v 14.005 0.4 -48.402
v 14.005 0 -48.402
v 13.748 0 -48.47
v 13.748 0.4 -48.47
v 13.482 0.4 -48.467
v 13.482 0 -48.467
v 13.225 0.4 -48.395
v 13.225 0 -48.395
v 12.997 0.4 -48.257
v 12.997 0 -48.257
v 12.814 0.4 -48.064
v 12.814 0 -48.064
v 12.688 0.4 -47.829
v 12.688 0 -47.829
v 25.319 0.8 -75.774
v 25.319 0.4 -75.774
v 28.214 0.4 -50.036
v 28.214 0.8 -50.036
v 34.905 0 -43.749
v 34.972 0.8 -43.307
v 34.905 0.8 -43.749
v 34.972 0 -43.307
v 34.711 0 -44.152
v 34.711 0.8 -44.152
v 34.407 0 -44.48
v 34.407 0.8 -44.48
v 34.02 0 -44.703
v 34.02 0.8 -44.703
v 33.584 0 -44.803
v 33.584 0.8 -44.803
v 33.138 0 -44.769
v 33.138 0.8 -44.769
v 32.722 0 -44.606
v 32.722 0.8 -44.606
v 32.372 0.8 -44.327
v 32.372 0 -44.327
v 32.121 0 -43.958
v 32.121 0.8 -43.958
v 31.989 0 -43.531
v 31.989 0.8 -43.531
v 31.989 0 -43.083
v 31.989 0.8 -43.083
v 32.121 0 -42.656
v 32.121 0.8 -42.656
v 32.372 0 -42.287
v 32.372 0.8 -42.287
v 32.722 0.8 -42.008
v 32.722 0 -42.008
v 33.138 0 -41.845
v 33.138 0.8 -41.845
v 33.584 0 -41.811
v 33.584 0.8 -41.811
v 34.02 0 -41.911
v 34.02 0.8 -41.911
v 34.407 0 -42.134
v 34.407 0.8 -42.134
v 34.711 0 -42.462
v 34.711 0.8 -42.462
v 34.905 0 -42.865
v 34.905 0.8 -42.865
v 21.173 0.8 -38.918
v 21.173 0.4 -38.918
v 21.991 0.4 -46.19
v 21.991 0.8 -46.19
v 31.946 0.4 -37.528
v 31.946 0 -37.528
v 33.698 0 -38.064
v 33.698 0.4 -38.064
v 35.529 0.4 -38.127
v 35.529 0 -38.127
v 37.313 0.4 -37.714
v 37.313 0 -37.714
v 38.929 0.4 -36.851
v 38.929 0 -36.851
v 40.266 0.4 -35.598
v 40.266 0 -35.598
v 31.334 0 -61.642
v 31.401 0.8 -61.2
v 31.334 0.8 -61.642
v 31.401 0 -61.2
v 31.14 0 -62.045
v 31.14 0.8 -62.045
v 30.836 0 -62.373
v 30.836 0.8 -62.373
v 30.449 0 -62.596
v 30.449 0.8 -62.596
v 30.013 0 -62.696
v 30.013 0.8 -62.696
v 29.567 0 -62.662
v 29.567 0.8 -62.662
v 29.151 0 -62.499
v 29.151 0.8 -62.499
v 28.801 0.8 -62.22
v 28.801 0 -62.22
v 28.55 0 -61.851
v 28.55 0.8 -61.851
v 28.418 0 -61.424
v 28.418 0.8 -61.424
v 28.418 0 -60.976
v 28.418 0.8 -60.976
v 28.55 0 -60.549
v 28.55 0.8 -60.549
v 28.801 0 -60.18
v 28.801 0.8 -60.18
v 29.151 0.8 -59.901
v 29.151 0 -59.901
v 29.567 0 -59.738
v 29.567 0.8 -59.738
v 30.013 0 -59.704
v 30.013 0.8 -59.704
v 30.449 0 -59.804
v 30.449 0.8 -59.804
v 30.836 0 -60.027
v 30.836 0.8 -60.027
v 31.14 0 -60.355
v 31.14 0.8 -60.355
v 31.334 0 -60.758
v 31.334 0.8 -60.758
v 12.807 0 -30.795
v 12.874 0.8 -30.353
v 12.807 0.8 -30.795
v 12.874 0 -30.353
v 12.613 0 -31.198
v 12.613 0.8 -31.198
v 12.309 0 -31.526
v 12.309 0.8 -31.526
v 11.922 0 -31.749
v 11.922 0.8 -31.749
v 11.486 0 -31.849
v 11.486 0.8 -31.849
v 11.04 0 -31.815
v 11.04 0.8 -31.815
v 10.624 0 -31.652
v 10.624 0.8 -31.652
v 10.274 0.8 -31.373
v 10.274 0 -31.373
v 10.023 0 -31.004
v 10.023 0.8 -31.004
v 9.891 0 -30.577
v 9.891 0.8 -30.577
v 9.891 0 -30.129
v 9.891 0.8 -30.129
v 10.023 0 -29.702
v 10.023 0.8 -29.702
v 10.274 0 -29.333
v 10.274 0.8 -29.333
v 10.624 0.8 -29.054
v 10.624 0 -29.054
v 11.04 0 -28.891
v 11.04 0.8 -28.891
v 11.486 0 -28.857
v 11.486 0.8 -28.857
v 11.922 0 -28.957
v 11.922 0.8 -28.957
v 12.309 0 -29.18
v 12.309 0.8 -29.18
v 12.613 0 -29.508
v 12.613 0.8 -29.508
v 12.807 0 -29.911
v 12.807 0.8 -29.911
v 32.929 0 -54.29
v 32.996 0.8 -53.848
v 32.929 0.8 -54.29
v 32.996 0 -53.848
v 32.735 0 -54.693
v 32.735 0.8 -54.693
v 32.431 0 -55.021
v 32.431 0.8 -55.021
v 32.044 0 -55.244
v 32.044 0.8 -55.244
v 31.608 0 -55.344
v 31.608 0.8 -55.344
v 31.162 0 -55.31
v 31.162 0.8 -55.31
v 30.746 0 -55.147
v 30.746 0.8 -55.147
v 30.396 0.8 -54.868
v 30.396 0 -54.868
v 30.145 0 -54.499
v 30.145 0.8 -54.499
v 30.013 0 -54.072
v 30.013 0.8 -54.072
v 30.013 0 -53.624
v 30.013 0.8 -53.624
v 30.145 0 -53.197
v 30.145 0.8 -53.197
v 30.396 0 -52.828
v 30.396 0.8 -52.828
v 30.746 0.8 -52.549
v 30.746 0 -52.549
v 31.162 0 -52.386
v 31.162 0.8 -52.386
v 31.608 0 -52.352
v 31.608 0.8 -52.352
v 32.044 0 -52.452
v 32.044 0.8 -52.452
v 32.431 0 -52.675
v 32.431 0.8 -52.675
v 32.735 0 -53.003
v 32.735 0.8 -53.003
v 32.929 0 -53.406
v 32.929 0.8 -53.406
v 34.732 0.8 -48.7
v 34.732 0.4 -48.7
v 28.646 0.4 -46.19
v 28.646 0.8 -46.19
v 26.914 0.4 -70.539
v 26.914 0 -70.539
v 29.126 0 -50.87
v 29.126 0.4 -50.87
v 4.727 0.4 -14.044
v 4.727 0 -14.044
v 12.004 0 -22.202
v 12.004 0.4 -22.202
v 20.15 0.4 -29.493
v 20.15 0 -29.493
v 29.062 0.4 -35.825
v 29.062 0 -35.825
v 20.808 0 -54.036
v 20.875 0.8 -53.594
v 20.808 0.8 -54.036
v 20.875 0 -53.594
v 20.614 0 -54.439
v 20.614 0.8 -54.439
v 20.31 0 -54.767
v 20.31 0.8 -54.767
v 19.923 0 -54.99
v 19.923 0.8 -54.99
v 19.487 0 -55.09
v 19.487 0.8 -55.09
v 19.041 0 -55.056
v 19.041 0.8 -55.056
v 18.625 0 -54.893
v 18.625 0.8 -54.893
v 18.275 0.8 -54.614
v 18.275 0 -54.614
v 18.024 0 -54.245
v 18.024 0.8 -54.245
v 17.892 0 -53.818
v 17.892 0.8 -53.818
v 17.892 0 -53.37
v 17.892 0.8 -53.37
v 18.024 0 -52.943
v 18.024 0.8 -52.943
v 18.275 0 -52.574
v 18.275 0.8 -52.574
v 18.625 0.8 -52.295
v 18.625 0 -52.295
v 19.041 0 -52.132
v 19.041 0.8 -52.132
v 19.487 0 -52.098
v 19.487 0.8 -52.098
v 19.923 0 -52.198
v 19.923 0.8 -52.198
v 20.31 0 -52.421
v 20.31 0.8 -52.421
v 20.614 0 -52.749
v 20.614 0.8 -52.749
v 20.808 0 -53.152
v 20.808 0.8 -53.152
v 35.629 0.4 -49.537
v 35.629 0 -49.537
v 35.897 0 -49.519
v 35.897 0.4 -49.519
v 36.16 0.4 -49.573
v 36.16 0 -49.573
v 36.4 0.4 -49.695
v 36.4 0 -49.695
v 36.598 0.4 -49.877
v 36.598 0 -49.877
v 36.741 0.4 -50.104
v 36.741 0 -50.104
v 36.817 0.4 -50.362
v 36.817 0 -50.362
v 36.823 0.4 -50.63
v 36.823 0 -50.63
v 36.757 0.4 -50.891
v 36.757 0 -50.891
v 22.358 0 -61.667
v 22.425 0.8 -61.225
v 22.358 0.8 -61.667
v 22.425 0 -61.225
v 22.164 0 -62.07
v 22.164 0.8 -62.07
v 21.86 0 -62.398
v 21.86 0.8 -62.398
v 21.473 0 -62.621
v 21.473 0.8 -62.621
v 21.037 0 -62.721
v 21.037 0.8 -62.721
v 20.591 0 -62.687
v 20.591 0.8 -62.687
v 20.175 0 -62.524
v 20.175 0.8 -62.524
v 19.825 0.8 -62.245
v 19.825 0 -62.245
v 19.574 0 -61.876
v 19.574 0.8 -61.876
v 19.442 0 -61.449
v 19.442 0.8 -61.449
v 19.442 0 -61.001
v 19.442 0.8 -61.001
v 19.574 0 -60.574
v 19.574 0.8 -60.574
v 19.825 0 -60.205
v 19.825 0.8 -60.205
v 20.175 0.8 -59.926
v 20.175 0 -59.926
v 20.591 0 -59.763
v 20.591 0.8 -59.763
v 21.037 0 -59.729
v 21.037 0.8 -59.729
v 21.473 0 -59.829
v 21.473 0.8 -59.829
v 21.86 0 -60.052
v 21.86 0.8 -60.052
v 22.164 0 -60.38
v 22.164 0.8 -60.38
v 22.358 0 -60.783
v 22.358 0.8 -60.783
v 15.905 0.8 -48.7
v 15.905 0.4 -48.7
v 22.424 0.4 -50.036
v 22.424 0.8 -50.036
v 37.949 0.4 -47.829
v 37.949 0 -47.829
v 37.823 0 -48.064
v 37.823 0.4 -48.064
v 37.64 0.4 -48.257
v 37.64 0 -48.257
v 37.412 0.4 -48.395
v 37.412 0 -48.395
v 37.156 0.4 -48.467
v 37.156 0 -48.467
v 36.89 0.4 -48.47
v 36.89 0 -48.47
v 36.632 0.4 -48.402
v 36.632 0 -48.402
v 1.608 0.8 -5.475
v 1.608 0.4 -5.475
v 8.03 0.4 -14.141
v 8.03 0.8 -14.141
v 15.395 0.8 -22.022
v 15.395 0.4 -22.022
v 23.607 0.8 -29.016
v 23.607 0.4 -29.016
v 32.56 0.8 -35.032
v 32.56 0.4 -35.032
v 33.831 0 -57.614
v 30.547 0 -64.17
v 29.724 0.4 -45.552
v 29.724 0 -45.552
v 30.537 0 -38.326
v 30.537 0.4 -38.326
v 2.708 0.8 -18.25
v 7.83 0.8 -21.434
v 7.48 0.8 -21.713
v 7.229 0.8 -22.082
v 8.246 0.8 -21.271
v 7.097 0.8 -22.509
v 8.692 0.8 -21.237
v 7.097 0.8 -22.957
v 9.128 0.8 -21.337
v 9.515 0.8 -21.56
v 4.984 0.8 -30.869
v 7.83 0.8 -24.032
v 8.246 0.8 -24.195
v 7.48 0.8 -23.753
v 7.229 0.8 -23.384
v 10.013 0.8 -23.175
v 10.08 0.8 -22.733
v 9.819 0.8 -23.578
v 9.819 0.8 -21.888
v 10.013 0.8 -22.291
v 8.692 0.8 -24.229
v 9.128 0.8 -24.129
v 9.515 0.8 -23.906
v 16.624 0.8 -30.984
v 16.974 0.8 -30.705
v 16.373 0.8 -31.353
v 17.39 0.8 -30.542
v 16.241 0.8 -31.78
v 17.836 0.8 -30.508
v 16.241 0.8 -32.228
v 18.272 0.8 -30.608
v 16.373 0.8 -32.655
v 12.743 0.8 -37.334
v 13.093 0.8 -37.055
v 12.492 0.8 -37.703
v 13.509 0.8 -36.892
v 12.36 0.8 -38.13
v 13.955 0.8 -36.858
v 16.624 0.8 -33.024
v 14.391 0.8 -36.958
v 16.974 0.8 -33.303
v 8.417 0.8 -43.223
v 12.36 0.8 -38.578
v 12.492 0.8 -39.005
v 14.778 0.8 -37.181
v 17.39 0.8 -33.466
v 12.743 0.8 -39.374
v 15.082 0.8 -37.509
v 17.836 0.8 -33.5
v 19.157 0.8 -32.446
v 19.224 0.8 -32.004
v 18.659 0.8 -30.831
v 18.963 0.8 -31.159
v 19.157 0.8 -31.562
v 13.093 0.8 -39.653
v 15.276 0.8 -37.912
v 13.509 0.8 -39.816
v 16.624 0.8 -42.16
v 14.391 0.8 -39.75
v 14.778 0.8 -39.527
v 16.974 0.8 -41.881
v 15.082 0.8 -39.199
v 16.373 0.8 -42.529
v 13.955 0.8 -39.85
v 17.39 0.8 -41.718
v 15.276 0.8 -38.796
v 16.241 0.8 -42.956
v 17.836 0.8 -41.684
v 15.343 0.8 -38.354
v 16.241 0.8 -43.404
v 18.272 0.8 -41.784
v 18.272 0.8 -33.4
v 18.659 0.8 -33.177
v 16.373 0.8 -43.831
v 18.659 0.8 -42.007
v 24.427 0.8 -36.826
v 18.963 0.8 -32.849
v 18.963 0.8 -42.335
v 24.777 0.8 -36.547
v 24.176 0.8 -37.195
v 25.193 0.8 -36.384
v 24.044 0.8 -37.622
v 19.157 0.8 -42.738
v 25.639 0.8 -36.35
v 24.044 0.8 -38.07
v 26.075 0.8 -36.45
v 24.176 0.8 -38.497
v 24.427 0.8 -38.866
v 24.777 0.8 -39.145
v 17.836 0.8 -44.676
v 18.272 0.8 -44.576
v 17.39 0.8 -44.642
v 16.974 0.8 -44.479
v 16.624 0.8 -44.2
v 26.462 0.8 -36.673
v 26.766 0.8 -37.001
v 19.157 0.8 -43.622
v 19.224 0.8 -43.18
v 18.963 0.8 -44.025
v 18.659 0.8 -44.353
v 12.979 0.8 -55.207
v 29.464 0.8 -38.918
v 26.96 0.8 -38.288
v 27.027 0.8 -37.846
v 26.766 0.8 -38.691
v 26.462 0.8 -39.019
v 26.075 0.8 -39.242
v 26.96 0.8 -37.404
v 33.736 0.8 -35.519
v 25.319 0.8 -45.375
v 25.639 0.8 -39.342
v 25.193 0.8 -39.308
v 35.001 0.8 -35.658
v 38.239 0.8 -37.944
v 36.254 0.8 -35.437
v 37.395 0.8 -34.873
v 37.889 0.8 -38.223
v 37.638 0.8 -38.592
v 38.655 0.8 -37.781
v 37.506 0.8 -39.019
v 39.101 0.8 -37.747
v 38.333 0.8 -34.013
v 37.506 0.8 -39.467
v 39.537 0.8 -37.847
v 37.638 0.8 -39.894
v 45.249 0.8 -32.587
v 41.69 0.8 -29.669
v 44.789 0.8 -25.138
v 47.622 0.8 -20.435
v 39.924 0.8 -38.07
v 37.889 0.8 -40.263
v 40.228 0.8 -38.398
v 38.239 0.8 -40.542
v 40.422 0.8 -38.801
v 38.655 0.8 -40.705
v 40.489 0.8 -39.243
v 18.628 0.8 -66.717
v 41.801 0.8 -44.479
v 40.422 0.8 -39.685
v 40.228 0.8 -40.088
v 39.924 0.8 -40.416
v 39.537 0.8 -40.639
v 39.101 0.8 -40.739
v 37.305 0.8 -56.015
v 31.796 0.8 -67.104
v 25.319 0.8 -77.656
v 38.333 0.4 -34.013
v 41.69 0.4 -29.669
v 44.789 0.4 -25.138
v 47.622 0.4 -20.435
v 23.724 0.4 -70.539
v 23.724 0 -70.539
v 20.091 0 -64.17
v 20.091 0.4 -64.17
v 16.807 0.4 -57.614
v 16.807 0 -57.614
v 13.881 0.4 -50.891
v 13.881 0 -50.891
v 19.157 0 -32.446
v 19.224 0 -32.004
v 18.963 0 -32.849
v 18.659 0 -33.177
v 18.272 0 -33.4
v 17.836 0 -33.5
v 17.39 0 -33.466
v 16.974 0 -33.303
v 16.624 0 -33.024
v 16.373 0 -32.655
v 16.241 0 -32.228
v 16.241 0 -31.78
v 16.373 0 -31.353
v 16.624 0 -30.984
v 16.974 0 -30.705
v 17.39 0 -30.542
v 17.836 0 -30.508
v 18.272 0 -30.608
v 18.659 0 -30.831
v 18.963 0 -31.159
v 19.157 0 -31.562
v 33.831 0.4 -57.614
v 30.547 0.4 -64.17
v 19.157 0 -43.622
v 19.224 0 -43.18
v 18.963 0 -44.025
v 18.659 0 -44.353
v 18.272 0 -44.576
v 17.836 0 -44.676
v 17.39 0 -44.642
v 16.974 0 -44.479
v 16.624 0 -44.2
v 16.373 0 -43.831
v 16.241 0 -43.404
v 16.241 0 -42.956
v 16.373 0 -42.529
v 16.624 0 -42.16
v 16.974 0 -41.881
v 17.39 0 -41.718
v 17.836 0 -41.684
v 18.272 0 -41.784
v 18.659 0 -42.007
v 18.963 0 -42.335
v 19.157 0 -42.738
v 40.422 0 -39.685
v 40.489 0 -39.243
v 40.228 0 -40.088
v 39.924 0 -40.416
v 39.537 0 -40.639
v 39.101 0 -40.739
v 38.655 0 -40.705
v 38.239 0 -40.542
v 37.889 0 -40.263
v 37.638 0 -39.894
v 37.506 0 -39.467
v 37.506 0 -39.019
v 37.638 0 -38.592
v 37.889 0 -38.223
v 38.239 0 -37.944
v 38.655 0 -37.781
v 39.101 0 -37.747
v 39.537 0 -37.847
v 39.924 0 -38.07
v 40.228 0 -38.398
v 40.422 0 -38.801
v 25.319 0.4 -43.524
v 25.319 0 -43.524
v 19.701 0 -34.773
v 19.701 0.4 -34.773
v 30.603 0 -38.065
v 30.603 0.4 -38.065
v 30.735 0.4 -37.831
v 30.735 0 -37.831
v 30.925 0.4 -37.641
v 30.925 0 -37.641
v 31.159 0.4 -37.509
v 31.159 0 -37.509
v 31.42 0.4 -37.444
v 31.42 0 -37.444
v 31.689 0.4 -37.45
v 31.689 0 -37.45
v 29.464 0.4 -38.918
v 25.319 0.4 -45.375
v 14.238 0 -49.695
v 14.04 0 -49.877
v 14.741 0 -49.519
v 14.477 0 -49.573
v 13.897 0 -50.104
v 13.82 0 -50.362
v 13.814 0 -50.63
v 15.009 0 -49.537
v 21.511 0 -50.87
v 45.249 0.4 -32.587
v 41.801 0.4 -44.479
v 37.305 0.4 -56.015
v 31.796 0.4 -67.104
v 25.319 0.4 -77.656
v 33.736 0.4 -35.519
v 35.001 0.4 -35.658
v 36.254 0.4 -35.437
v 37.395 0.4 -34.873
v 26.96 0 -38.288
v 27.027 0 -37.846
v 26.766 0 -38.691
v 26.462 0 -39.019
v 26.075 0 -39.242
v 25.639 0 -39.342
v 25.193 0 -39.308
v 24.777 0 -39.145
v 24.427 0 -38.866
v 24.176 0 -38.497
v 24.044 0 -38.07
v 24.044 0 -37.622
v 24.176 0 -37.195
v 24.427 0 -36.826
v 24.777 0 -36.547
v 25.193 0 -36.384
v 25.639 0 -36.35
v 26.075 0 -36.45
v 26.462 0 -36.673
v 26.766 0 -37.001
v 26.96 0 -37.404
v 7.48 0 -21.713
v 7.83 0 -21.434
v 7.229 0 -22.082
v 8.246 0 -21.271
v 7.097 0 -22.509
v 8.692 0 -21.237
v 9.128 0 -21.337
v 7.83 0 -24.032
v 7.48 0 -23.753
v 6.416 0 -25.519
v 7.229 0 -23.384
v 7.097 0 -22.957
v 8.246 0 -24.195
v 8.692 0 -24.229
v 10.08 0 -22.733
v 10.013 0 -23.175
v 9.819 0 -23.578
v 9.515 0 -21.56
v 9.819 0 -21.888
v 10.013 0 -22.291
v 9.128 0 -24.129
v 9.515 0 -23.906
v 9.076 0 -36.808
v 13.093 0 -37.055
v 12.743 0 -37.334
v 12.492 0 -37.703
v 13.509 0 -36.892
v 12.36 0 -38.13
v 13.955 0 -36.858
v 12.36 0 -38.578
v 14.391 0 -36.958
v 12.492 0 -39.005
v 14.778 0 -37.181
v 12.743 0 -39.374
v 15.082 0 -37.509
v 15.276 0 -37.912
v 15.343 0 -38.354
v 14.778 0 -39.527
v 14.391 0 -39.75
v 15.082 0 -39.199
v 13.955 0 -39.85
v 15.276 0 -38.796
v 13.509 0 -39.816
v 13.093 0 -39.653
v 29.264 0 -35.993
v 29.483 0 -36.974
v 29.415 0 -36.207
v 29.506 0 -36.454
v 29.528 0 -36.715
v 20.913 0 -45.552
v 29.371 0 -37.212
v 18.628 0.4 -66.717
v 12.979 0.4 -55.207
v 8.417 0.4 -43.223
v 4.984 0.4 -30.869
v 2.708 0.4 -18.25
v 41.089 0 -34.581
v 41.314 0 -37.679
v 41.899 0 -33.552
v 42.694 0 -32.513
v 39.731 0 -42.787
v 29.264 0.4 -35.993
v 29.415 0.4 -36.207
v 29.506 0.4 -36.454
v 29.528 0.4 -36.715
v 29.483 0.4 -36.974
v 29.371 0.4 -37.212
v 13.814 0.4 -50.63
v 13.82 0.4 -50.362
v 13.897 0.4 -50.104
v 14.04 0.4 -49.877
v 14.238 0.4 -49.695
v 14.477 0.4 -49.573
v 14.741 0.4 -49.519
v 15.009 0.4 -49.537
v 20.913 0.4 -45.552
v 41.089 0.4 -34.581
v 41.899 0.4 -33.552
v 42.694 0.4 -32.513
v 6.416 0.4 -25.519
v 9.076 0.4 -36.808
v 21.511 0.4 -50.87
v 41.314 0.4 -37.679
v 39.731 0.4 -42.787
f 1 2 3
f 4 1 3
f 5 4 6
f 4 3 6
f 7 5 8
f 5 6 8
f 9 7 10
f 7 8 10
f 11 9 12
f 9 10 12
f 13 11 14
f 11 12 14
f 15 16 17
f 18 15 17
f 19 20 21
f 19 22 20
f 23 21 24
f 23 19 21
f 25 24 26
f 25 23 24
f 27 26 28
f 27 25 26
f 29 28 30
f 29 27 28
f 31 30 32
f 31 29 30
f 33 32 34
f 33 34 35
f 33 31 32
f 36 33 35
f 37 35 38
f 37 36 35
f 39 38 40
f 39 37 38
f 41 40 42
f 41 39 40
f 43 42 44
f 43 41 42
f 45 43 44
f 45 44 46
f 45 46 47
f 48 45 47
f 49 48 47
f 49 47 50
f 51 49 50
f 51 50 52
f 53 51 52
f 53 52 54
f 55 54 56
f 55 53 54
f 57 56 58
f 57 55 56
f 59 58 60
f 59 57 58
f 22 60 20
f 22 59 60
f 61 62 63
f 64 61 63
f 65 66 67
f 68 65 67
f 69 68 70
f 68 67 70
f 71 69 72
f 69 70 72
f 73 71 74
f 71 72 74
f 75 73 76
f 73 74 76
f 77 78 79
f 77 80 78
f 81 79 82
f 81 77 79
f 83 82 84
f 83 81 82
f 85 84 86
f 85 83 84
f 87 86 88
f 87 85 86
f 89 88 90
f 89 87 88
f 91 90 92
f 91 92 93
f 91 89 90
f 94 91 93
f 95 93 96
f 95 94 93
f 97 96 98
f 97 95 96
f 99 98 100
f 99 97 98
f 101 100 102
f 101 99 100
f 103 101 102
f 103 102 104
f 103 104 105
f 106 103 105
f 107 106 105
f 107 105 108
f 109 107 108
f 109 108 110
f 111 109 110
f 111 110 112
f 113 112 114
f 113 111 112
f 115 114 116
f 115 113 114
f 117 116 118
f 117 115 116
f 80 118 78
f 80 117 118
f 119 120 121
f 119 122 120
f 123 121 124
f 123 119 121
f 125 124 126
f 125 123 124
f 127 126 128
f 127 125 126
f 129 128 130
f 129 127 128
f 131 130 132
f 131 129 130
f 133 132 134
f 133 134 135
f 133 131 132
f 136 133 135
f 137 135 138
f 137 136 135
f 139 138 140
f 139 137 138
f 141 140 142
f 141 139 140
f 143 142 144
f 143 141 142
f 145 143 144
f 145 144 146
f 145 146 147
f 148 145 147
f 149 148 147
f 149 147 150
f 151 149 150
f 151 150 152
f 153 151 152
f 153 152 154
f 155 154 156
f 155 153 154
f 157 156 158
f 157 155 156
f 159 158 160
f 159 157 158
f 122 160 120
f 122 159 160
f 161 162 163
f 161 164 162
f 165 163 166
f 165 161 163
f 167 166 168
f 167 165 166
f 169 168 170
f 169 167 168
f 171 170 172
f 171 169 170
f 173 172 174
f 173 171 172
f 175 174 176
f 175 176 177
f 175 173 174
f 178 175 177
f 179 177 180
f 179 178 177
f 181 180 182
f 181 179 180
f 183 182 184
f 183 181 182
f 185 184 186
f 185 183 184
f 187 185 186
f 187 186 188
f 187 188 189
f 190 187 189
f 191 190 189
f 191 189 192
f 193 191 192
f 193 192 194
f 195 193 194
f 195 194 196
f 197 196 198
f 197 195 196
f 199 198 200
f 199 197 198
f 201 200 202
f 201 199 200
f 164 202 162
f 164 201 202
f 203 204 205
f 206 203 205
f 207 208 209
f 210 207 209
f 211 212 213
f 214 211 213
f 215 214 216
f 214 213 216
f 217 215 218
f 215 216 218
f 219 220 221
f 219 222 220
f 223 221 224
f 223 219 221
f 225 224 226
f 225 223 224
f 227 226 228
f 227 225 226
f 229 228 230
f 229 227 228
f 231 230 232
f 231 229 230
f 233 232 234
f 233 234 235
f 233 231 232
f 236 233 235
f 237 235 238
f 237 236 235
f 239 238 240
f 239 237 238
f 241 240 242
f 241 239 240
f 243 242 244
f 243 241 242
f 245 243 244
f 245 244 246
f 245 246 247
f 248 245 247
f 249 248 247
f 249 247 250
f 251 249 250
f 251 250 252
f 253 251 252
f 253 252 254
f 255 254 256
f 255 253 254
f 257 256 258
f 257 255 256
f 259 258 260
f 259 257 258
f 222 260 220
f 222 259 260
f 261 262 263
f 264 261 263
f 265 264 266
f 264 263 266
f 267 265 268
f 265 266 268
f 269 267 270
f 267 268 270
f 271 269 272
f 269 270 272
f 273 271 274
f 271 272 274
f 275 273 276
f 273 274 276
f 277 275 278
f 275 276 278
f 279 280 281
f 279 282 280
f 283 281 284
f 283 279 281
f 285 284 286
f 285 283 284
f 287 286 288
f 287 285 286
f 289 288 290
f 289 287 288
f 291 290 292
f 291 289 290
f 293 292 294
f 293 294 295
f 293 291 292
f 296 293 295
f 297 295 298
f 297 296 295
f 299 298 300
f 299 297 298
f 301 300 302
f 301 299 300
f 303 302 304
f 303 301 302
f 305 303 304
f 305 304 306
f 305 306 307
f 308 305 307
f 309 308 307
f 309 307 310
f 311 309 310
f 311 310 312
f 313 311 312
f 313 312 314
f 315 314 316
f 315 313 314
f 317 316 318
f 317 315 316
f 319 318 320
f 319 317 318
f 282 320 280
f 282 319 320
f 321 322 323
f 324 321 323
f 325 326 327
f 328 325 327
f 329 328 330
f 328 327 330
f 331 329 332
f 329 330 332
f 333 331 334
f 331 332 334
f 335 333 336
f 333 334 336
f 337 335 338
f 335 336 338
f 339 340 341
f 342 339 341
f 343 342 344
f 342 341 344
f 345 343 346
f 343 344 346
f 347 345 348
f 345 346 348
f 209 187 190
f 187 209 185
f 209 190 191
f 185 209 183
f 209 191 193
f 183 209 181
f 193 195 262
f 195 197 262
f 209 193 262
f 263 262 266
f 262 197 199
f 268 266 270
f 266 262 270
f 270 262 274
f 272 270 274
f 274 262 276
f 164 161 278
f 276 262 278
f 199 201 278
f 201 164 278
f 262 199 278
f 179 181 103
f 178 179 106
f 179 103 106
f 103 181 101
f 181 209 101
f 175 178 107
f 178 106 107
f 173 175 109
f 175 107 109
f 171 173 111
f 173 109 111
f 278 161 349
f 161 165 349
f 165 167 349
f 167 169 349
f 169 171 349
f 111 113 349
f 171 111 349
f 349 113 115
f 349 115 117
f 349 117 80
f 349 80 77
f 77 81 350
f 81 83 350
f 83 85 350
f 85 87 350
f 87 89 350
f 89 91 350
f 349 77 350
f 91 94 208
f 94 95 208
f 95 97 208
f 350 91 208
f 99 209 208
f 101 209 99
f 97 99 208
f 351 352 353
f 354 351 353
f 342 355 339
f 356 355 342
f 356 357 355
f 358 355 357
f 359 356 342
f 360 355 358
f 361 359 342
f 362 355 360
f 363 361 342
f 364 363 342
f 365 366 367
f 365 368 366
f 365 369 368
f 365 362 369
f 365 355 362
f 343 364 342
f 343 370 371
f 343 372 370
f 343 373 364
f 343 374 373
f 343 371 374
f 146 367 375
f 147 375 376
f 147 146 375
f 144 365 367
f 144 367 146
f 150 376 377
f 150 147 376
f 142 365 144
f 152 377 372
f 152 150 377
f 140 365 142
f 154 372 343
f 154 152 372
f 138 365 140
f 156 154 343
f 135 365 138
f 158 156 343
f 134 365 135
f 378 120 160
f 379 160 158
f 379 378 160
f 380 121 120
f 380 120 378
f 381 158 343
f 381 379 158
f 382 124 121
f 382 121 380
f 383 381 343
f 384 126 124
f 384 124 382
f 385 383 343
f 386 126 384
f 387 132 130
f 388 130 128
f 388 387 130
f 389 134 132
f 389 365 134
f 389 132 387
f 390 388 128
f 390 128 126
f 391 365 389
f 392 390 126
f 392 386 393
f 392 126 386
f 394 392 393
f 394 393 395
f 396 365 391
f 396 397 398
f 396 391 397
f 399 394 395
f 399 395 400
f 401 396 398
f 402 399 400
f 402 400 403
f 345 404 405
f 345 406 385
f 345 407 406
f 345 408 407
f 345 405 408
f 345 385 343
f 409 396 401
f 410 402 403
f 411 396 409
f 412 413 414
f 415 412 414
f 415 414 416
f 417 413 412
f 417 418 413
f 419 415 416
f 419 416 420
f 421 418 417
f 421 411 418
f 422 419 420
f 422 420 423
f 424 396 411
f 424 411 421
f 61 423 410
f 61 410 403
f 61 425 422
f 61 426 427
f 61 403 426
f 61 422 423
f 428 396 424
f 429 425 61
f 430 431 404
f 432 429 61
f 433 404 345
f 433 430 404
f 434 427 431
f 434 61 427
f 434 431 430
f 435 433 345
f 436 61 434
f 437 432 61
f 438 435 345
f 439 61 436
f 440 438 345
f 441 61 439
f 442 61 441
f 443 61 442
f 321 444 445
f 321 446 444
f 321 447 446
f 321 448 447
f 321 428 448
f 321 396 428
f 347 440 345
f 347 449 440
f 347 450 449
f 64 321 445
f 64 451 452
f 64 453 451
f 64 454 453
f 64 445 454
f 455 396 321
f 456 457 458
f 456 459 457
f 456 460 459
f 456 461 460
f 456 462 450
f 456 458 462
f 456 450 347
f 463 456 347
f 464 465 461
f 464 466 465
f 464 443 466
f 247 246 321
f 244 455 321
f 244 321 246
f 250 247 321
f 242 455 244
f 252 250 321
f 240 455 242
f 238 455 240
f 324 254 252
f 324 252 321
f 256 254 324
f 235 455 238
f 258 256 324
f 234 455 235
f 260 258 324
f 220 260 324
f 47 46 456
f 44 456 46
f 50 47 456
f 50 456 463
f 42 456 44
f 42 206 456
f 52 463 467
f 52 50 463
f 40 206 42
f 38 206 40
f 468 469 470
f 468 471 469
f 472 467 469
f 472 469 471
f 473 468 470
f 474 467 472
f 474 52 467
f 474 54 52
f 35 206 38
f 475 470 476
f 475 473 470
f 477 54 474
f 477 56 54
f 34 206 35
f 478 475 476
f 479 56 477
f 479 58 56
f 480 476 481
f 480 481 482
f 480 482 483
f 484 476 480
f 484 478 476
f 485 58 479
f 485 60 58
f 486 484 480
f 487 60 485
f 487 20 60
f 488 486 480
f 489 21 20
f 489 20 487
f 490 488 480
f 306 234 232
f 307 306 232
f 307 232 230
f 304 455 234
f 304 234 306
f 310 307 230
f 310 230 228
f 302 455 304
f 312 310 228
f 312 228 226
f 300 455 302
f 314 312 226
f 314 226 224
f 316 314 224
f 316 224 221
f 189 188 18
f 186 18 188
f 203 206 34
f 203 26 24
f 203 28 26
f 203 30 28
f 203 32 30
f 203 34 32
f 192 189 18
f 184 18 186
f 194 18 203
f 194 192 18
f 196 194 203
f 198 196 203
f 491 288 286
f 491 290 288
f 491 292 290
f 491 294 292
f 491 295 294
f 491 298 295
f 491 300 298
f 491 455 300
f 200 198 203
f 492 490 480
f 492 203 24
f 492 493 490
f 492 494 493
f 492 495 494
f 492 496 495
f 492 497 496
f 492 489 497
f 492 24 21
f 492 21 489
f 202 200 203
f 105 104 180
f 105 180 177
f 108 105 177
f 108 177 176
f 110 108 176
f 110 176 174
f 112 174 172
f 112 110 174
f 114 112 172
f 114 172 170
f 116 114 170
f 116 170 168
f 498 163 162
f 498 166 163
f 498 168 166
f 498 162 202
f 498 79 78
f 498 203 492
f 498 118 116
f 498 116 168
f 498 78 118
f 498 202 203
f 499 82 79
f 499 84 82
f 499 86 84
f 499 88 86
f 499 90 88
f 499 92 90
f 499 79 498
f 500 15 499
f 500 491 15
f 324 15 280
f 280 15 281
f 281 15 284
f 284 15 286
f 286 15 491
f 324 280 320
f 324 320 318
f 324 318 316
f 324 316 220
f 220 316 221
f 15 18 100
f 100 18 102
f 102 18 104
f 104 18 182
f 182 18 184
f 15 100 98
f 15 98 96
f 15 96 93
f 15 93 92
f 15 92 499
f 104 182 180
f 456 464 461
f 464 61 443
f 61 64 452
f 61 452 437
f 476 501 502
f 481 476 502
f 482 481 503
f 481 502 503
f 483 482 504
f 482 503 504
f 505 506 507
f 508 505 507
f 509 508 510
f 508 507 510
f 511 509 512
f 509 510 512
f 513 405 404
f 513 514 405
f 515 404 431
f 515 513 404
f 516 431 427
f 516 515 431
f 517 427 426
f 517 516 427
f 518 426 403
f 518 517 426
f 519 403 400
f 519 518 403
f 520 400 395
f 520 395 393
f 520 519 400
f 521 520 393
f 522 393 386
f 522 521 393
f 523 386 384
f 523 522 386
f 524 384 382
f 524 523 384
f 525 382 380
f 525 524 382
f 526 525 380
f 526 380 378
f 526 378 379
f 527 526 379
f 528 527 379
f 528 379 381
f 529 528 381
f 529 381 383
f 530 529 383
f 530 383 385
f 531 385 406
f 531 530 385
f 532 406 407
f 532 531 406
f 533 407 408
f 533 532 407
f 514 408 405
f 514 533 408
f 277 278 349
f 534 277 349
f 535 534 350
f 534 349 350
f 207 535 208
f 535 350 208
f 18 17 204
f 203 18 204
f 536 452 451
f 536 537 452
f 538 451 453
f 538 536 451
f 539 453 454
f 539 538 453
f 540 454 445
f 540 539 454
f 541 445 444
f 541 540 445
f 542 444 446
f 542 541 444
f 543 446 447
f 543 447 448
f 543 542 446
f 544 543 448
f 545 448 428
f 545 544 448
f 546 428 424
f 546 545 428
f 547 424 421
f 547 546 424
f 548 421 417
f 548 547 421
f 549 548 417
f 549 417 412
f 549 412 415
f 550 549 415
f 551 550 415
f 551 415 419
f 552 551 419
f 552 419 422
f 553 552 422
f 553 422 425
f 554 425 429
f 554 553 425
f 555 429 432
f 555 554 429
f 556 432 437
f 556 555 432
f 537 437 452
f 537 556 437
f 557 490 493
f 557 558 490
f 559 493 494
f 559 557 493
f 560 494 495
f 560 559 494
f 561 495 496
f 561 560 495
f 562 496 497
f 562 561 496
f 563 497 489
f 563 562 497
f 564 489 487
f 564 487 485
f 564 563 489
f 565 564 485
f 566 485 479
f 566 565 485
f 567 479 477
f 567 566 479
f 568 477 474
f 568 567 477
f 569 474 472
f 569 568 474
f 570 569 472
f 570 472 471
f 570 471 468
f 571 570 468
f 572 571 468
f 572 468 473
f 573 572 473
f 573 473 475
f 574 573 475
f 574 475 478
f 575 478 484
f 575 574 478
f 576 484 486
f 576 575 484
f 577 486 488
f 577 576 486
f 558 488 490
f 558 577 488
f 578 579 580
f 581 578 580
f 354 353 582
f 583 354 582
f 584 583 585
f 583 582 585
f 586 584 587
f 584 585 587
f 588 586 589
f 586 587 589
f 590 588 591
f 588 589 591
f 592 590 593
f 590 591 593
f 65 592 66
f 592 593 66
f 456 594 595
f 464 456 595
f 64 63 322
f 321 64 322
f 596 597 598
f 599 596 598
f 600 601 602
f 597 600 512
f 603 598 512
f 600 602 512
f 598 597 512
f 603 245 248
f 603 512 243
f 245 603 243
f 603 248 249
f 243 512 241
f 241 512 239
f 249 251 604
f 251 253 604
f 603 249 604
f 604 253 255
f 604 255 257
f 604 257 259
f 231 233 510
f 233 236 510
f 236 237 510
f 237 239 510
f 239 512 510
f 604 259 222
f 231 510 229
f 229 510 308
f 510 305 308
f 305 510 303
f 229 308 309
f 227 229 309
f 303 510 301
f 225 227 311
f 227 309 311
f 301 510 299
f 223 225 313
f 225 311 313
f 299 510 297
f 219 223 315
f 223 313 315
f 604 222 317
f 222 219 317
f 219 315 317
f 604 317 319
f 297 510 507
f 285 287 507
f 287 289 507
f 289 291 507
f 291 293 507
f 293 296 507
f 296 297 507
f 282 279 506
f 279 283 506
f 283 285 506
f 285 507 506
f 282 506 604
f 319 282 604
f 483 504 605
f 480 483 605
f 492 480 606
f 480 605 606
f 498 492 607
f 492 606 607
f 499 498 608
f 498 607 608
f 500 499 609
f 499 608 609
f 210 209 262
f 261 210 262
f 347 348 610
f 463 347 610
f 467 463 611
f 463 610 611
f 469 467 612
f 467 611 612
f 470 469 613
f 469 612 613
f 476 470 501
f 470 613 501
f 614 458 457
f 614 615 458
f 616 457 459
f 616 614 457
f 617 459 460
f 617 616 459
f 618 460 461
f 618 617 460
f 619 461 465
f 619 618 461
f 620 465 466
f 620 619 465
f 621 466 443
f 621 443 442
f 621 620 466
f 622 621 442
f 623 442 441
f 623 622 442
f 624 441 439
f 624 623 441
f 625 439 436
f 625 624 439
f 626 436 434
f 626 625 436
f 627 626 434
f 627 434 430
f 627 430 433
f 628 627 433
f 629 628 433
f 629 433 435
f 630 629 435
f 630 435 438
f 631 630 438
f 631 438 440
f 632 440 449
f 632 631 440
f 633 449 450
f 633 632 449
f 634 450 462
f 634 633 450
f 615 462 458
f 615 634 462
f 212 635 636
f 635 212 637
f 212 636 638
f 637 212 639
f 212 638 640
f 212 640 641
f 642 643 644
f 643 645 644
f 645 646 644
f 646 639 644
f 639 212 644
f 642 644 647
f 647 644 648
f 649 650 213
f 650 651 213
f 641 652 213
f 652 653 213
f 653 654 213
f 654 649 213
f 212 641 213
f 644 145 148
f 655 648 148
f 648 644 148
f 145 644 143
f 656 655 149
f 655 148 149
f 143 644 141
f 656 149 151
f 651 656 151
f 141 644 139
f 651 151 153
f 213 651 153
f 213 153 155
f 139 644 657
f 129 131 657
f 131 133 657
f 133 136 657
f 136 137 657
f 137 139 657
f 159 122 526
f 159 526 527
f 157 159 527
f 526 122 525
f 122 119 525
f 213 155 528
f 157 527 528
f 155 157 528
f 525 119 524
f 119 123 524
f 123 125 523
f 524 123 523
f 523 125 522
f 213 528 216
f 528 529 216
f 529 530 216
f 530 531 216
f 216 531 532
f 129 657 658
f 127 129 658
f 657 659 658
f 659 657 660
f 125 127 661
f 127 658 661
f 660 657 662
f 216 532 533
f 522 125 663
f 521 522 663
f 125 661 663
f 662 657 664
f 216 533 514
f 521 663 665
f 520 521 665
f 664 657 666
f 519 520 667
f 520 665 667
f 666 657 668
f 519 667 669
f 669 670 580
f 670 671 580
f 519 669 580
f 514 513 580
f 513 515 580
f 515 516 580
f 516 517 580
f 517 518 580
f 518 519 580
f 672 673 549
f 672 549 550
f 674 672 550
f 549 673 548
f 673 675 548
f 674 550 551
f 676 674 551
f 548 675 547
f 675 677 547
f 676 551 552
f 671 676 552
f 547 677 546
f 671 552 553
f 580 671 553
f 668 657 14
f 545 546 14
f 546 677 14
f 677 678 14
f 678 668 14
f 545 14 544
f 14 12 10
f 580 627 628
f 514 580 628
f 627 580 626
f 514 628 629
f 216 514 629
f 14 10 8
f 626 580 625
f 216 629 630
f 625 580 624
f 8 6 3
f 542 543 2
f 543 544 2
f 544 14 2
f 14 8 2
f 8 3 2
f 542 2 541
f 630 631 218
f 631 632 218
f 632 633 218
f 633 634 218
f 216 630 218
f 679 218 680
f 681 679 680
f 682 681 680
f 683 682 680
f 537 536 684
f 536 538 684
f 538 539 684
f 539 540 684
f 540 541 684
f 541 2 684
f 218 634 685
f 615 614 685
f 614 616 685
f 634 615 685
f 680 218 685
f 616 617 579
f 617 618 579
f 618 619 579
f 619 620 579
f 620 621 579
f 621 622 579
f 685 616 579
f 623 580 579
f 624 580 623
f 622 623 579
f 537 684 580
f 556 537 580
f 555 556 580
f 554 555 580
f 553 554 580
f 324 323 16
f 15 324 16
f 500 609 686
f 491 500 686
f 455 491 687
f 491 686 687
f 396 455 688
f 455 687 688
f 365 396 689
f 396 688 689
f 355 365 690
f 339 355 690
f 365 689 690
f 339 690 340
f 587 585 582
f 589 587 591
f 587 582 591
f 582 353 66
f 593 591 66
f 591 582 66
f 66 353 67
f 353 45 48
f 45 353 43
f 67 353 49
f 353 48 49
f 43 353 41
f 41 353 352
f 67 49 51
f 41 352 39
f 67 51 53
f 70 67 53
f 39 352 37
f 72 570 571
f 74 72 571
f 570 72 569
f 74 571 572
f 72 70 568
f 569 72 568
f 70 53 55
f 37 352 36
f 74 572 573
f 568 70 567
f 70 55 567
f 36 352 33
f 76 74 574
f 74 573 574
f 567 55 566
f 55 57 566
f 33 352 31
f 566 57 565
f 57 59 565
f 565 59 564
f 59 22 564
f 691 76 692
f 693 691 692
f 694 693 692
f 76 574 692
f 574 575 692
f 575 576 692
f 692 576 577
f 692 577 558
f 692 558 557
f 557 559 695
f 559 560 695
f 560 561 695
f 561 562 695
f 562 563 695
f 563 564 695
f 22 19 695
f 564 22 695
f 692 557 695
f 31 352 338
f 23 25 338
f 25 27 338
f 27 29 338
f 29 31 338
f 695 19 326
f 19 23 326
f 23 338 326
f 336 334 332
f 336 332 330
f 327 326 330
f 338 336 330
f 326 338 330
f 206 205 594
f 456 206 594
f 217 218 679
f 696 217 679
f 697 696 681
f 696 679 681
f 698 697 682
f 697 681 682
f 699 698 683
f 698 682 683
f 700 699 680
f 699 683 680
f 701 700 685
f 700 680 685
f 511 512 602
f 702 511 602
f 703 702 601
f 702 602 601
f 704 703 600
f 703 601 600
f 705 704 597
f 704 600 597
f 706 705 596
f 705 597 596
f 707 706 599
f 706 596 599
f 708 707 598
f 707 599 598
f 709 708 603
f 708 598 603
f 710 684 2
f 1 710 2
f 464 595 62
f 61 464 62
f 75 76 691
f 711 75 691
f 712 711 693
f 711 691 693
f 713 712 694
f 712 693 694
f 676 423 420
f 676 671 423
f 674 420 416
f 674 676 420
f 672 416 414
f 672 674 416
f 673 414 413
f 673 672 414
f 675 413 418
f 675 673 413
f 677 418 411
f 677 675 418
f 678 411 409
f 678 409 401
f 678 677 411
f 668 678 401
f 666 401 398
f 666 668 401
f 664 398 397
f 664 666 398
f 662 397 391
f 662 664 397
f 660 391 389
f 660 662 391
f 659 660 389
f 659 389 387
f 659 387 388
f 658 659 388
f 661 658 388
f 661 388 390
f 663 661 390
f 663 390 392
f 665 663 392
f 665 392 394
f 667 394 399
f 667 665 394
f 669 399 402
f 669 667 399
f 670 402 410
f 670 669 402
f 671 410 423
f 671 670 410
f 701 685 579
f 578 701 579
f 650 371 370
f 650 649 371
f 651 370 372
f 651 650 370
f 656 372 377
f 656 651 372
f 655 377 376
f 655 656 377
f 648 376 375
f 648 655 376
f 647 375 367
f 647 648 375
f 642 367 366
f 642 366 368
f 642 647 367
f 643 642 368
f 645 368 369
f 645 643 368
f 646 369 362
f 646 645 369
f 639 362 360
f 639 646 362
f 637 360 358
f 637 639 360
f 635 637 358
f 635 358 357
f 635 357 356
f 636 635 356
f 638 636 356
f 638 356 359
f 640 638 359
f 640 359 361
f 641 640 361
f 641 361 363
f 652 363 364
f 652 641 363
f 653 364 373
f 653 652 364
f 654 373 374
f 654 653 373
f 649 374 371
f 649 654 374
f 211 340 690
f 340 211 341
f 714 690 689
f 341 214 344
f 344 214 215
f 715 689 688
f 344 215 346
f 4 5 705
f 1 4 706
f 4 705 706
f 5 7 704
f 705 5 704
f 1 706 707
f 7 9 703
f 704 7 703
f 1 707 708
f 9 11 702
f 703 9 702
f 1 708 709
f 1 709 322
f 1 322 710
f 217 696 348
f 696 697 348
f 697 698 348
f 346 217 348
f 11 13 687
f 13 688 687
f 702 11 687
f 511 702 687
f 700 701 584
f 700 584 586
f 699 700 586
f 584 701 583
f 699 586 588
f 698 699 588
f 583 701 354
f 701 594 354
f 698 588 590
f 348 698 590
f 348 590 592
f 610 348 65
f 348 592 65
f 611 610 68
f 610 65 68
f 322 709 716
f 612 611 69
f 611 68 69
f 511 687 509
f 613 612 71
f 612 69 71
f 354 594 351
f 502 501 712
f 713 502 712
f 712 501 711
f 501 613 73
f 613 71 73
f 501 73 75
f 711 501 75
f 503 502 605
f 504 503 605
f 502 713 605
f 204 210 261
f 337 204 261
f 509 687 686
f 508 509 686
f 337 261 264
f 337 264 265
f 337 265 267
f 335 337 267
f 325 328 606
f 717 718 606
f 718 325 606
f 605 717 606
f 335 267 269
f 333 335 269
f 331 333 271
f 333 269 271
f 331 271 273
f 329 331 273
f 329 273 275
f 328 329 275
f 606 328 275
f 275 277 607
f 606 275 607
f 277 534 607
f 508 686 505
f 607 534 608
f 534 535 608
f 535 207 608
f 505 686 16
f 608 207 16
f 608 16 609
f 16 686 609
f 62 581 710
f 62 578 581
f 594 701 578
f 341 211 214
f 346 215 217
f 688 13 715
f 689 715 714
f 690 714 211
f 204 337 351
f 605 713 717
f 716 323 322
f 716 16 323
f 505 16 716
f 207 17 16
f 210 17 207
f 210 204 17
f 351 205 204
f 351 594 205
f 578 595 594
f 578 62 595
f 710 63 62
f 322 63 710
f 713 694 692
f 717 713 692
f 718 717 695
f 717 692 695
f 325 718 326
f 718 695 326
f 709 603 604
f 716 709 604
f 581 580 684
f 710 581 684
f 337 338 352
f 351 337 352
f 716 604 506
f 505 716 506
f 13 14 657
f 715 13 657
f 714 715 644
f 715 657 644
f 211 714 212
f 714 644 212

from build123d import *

# Parameters (mm, degrees)
SKETCH4_R             = 1.5
BOSS_EXTRUDE1_DEPTH   = 0.4
BOSS_EXTRUDE1_2_DEPTH = 0.4
BOSS_EXTRUDE1_3_DEPTH = 0.4
BOSS_EXTRUDE1_4_DEPTH = 0.4
SKETCH5_R             = 1.5
BOSS_EXTRUDE2_DEPTH   = 0.4


with BuildPart() as part:
    # Sketch4 → Boss-Extrude1 (new body)
    with BuildSketch(Plane(origin=(0, 0, 0), x_dir=(1, 0, 0), z_dir=(0, 1, 0))):
        with BuildLine():
            Line((36.631982775, 48.402124759), (29.724109313, 45.552485279))
            Line((29.724109313, 45.552485279), (30.536926129, 38.325609907))
            ThreePointArc((30.536926129, 38.325609907), (31.037916291, 37.567202472), (31.94599849, 37.527709405))
            ThreePointArc((31.94599849, 37.527709405), (36.434517541, 37.979126286), (40.266354995, 35.59845365))
            ThreePointArc((40.266354995, 35.59845365), (41.495664758, 34.067994846), (42.693859526, 32.513055637))
            ThreePointArc((42.693859526, 32.513055637), (40.547573161, 40.24119879), (37.949447695, 47.829379455))
            ThreePointArc((37.949447695, 47.829379455), (37.412017647, 48.394779577), (36.631982775, 48.402124759))
        make_face()
        with Locations((33.472, 43.307)):
            Circle(SKETCH4_R, mode=Mode.SUBTRACT)
        with Locations((38.989, 39.243)):
            Circle(SKETCH4_R, mode=Mode.SUBTRACT)
    extrude(amount=BOSS_EXTRUDE1_DEPTH)



with BuildPart() as body_2:
    # Sketch4 → Boss-Extrude1 2 (new body)
    with BuildSketch(Plane(origin=(0, 0, 0), x_dir=(1, 0, 0), z_dir=(0, 1, 0))):
        with BuildLine():
            Line((26.913796721, 70.539393135), (29.126057014, 50.869857351))
            Line((29.126057014, 50.869857351), (35.62874213, 49.537078309))
            ThreePointArc((35.62874213, 49.537078309), (36.597764867, 49.876549859), (36.756875392, 50.890911647))
            ThreePointArc((36.756875392, 50.890911647), (32.232858108, 60.91429454), (26.913796721, 70.539393135))
        make_face()
        with Locations((31.496, 53.848)):
            Circle(SKETCH4_R, mode=Mode.SUBTRACT)
        with Locations((29.901, 61.2)):
            Circle(SKETCH4_R, mode=Mode.SUBTRACT)
    extrude(amount=BOSS_EXTRUDE1_2_DEPTH)


with BuildPart() as body_3:
    # Sketch4 → Boss-Extrude1 3 (new body)
    with BuildSketch(Plane(origin=(0, 0, 0), x_dir=(1, 0, 0), z_dir=(0, 1, 0))):
        with BuildLine():
            Line((20.913318286, 45.552485279), (14.005444824, 48.402124759))
            ThreePointArc((14.005444824, 48.402124759), (13.225409952, 48.394779577), (12.687979904, 47.829379455))
            ThreePointArc((12.687979904, 47.829379455), (7.625203146, 31.191555875), (4.727035456, 14.043684112))
            ThreePointArc((4.727035456, 14.043684112), (15.974402208, 25.962258497), (29.061917895, 35.824946131))
            ThreePointArc((29.061917895, 35.824946131), (29.505500168, 36.453855806), (29.370974364, 37.211612641))
            Line((29.370974364, 37.211612641), (25.3187138, 43.52403979))
            Line((25.3187138, 43.52403979), (19.700923362, 34.77290143))
            Line((19.700923362, 34.77290143), (20.913318286, 45.552485279))
        make_face()
        with Locations((8.58, 22.733)):
            Circle(SKETCH4_R, mode=Mode.SUBTRACT)
        with Locations((11.374, 30.353)):
            Circle(SKETCH4_R, mode=Mode.SUBTRACT)
        with Locations((13.843, 38.354)):
            Circle(SKETCH4_R, mode=Mode.SUBTRACT)
        with Locations((17.724, 32.004)):
            Circle(SKETCH4_R, mode=Mode.SUBTRACT)
        with Locations((17.724, 43.18)):
            Circle(SKETCH4_R, mode=Mode.SUBTRACT)
        with Locations((25.527, 37.846)):
            Circle(SKETCH4_R, mode=Mode.SUBTRACT)
    extrude(amount=BOSS_EXTRUDE1_3_DEPTH)


with BuildPart() as body_4:
    # Sketch4 → Boss-Extrude1 4 (new body)
    with BuildSketch(Plane(origin=(0, 0, 0), x_dir=(1, 0, 0), z_dir=(0, 1, 0))):
        with BuildLine():
            Line((15.008685469, 49.537078309), (21.511370585, 50.869857351))
            Line((21.511370585, 50.869857351), (23.723630878, 70.539393135))
            ThreePointArc((23.723630878, 70.539393135), (18.404569491, 60.91429454), (13.880552207, 50.890911647))
            ThreePointArc((13.880552207, 50.890911647), (14.039662732, 49.876549859), (15.008685469, 49.537078309))
        make_face()
        with Locations((19.375, 53.594)):
            Circle(SKETCH4_R, mode=Mode.SUBTRACT)
        with Locations((20.925, 61.225)):
            Circle(SKETCH4_R, mode=Mode.SUBTRACT)
    extrude(amount=BOSS_EXTRUDE1_4_DEPTH)


with BuildPart() as part_1:
    add(part.part)

    add(body_2.part)  # Boss-Extrude2 merges body 2

    add(body_3.part)  # Boss-Extrude2 merges body 3

    add(body_4.part)  # Boss-Extrude2 merges body 4
    # Sketch5 → Boss-Extrude2 (add)
    with BuildSketch(Plane(origin=(0, 0.4, 0), x_dir=(1, 0, 0), z_dir=(0, 1, 0))):
        with BuildLine():
            ThreePointArc((25.3187138, 77.655988793), (8.417285199, 43.223132296), (1.60825988, 5.475058578))
            ThreePointArc((1.60825988, 5.475058578), (15.395050063, 22.022293224), (32.560079542, 35.031840527))
            ThreePointArc((32.560079542, 35.031840527), (35.635218263, 35.591596594), (38.333143822, 34.01330553))
            ThreePointArc((38.333143822, 34.01330553), (43.27239761, 27.425793547), (47.621637666, 20.434681115))
            ThreePointArc((47.621637666, 20.434681115), (39.681799875, 50.297117055), (25.3187138, 77.655988793))
        make_face()
        with Locations((8.58, 22.733)):
            Circle(SKETCH5_R, mode=Mode.SUBTRACT)
        with Locations((11.374, 30.353)):
            Circle(SKETCH5_R, mode=Mode.SUBTRACT)
        with Locations((17.724, 43.18)):
            Circle(SKETCH5_R, mode=Mode.SUBTRACT)
        with Locations((13.843, 38.354)):
            Circle(SKETCH5_R, mode=Mode.SUBTRACT)
        with Locations((17.724, 32.004)):
            Circle(SKETCH5_R, mode=Mode.SUBTRACT)
        with Locations((38.989, 39.243)):
            Circle(SKETCH5_R, mode=Mode.SUBTRACT)
        with Locations((33.472, 43.307)):
            Circle(SKETCH5_R, mode=Mode.SUBTRACT)
        with Locations((31.496, 53.848)):
            Circle(SKETCH5_R, mode=Mode.SUBTRACT)
        with Locations((29.901, 61.2)):
            Circle(SKETCH5_R, mode=Mode.SUBTRACT)
        with Locations((20.925, 61.225)):
            Circle(SKETCH5_R, mode=Mode.SUBTRACT)
        with Locations((19.375, 53.594)):
            Circle(SKETCH5_R, mode=Mode.SUBTRACT)
        with Locations((25.527, 37.846)):
            Circle(SKETCH5_R, mode=Mode.SUBTRACT)
        Polygon((22.423901789, 50.036100284), (25.3187138, 75.774305051), (28.21352581, 50.036100284), (34.731994844, 48.700086198), (28.646152557, 46.189551437), (29.464018945, 38.917779558), (25.3187138, 45.375147323), (21.173408654, 38.917779558), (21.991275042, 46.189551437), (15.905432755, 48.700086198), align=None, mode=Mode.SUBTRACT)
    extrude(amount=BOSS_EXTRUDE2_DEPTH)


solid = part_1.part
